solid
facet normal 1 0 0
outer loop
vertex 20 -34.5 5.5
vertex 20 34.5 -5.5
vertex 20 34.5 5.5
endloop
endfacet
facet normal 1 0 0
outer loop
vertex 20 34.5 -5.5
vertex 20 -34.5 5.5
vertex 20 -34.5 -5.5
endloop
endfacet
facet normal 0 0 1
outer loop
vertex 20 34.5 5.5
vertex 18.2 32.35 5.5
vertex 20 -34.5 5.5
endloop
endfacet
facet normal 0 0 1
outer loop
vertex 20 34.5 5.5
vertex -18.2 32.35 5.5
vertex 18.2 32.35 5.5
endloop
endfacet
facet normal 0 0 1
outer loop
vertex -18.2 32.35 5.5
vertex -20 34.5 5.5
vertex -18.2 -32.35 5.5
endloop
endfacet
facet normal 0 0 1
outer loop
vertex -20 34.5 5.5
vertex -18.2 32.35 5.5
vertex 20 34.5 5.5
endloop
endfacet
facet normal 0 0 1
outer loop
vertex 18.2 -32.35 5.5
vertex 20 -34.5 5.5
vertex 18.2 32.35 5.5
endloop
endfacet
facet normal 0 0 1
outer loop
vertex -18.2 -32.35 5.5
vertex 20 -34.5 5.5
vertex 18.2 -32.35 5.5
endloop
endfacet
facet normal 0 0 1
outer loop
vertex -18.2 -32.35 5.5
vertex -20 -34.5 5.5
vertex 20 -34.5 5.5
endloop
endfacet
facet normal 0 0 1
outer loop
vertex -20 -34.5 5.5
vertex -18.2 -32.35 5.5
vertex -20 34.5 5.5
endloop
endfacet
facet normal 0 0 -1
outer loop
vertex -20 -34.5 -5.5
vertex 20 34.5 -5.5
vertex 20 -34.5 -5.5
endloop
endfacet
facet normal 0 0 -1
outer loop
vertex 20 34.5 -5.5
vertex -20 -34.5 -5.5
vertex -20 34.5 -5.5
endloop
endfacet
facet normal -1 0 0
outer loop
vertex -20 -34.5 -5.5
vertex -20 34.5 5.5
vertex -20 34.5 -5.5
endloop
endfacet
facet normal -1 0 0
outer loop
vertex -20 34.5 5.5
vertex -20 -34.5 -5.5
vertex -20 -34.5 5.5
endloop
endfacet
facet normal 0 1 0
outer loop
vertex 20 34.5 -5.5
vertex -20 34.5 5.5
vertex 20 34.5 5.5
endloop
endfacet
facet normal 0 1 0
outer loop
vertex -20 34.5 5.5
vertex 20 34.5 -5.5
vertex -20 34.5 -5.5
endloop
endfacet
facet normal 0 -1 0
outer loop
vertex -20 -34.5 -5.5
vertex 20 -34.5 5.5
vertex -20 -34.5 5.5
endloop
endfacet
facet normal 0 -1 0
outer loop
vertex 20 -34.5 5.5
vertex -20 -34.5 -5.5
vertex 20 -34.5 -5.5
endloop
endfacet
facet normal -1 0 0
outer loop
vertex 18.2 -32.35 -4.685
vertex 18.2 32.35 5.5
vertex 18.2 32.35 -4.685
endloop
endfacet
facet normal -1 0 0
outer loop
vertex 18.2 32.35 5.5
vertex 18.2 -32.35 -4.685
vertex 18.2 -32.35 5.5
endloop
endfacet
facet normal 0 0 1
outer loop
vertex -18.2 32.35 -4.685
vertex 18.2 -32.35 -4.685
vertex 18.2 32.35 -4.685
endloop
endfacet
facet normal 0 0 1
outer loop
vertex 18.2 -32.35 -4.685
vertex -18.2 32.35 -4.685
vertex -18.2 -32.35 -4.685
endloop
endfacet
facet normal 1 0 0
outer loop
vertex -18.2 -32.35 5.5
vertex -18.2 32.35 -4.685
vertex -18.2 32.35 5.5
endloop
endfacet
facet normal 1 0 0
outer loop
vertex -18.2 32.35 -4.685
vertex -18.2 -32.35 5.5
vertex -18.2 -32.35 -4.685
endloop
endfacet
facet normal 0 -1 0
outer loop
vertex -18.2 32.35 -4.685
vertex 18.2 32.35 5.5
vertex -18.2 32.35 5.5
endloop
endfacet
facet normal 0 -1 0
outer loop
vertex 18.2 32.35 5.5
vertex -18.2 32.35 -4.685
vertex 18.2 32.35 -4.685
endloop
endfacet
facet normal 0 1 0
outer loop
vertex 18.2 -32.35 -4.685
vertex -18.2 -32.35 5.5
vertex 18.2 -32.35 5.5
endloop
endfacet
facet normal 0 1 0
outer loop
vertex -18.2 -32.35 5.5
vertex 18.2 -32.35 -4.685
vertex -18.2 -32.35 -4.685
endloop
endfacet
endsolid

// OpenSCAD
// file: BOSL2/std.scad
// Minimal BOSL2 compatibility shim for bundled gallery models.
// It implements only the helpers used by the imported OpenSCAD projects.

CENTER = [0, 0, 0];
BOTTOM = [0, 0, -1];
TOP = [0, 0, 1];
LEFT = [-1, 0, 0];
RIGHT = [1, 0, 0];
FRONT = [0, -1, 0];
BACK = [0, 1, 0];

module up(z=0) {
    translate([0, 0, z]) children();
}

module down(z=0) {
    translate([0, 0, -z]) children();
}

module attach(anchor=CENTER) {
    children();
}

module cuboid(size=[1, 1, 1], anchor=CENTER) {
    center = anchor == CENTER;
    translate(center ? [0, 0, 0] : [0, 0, size[2] / 2])
        cube(size, center=true);
    children();
}

module xcyl(h=1, r=1, anchor=CENTER) {
    center = anchor == CENTER;
    translate(center ? [0, 0, 0] : [h / 2, 0, 0])
        rotate([0, 90, 0])
            cylinder(h=h, r=r, center=true);
}
// main file
include <BOSL2/std.scad>


// main shell
module shell(anchor = CENTER) {
    width = 40;
    length = 69;
    full_thickness = 11;
    panel_thickness = 0.865;
    wall_thickness_narrow = 3.6;
    wall_thickness_thicker = 4.3;

    difference() {
        cuboid(size=[width, length, full_thickness], rounding=2,edges=[BOTTOM],$fn=24);
        up(panel_thickness) cuboid(size=[width-wall_thickness_narrow, length-wall_thickness_thicker, full_thickness + 0.1],
            rounding=5,
            edges=[LEFT+BACK, RIGHT+FRONT, LEFT+FRONT, RIGHT+BACK]
        );
    };
};



module insert(anchor = CENTER) {
    width = 32.5;
    length = 59.5;
    edge_height = 5.75;
    edge_thickness = 2.0;
    attachable(anchor) {
        cuboid(size=[width,length,1], anchor) {
            // circle bit
            diff(remove="cutout")
            tag("supports") position(TOP+BACK) tube(id=30.45, wall=edge_thickness, h=edge_height, anchor=BACK+BOTTOM) {
                align(TOP,overlap=1) back(14) tag("cutout") cuboid(size=[16.5, 10, 10]);
                align(LEFT,shiftout=-2,inside=true) fwd(3) tag("hole")  tube(id=2.7, wall=2, h=edge_height);
                align(RIGHT,shiftout=-2,inside=true) fwd(3) tag("hole")  tube(id=2.7, wall=2, h=edge_height);
                attach(FRONT,BOTTOM,overlap=0.1) tag("support") cuboid(size=[edge_thickness, edge_height, 25-edge_thickness], anchor=FRONT)
                    align(TOP,overlap=0.1) tag("support") cuboid(size=[25, edge_height, edge_thickness], anchor=FRONT)
                        align(TOP) back(2) tag("cutout") xrot(-100) cuboid(size=[40, 10, 2], anchor=FRONT+BOTTOM);
            };
        };
        children();
    };
};

shell();
